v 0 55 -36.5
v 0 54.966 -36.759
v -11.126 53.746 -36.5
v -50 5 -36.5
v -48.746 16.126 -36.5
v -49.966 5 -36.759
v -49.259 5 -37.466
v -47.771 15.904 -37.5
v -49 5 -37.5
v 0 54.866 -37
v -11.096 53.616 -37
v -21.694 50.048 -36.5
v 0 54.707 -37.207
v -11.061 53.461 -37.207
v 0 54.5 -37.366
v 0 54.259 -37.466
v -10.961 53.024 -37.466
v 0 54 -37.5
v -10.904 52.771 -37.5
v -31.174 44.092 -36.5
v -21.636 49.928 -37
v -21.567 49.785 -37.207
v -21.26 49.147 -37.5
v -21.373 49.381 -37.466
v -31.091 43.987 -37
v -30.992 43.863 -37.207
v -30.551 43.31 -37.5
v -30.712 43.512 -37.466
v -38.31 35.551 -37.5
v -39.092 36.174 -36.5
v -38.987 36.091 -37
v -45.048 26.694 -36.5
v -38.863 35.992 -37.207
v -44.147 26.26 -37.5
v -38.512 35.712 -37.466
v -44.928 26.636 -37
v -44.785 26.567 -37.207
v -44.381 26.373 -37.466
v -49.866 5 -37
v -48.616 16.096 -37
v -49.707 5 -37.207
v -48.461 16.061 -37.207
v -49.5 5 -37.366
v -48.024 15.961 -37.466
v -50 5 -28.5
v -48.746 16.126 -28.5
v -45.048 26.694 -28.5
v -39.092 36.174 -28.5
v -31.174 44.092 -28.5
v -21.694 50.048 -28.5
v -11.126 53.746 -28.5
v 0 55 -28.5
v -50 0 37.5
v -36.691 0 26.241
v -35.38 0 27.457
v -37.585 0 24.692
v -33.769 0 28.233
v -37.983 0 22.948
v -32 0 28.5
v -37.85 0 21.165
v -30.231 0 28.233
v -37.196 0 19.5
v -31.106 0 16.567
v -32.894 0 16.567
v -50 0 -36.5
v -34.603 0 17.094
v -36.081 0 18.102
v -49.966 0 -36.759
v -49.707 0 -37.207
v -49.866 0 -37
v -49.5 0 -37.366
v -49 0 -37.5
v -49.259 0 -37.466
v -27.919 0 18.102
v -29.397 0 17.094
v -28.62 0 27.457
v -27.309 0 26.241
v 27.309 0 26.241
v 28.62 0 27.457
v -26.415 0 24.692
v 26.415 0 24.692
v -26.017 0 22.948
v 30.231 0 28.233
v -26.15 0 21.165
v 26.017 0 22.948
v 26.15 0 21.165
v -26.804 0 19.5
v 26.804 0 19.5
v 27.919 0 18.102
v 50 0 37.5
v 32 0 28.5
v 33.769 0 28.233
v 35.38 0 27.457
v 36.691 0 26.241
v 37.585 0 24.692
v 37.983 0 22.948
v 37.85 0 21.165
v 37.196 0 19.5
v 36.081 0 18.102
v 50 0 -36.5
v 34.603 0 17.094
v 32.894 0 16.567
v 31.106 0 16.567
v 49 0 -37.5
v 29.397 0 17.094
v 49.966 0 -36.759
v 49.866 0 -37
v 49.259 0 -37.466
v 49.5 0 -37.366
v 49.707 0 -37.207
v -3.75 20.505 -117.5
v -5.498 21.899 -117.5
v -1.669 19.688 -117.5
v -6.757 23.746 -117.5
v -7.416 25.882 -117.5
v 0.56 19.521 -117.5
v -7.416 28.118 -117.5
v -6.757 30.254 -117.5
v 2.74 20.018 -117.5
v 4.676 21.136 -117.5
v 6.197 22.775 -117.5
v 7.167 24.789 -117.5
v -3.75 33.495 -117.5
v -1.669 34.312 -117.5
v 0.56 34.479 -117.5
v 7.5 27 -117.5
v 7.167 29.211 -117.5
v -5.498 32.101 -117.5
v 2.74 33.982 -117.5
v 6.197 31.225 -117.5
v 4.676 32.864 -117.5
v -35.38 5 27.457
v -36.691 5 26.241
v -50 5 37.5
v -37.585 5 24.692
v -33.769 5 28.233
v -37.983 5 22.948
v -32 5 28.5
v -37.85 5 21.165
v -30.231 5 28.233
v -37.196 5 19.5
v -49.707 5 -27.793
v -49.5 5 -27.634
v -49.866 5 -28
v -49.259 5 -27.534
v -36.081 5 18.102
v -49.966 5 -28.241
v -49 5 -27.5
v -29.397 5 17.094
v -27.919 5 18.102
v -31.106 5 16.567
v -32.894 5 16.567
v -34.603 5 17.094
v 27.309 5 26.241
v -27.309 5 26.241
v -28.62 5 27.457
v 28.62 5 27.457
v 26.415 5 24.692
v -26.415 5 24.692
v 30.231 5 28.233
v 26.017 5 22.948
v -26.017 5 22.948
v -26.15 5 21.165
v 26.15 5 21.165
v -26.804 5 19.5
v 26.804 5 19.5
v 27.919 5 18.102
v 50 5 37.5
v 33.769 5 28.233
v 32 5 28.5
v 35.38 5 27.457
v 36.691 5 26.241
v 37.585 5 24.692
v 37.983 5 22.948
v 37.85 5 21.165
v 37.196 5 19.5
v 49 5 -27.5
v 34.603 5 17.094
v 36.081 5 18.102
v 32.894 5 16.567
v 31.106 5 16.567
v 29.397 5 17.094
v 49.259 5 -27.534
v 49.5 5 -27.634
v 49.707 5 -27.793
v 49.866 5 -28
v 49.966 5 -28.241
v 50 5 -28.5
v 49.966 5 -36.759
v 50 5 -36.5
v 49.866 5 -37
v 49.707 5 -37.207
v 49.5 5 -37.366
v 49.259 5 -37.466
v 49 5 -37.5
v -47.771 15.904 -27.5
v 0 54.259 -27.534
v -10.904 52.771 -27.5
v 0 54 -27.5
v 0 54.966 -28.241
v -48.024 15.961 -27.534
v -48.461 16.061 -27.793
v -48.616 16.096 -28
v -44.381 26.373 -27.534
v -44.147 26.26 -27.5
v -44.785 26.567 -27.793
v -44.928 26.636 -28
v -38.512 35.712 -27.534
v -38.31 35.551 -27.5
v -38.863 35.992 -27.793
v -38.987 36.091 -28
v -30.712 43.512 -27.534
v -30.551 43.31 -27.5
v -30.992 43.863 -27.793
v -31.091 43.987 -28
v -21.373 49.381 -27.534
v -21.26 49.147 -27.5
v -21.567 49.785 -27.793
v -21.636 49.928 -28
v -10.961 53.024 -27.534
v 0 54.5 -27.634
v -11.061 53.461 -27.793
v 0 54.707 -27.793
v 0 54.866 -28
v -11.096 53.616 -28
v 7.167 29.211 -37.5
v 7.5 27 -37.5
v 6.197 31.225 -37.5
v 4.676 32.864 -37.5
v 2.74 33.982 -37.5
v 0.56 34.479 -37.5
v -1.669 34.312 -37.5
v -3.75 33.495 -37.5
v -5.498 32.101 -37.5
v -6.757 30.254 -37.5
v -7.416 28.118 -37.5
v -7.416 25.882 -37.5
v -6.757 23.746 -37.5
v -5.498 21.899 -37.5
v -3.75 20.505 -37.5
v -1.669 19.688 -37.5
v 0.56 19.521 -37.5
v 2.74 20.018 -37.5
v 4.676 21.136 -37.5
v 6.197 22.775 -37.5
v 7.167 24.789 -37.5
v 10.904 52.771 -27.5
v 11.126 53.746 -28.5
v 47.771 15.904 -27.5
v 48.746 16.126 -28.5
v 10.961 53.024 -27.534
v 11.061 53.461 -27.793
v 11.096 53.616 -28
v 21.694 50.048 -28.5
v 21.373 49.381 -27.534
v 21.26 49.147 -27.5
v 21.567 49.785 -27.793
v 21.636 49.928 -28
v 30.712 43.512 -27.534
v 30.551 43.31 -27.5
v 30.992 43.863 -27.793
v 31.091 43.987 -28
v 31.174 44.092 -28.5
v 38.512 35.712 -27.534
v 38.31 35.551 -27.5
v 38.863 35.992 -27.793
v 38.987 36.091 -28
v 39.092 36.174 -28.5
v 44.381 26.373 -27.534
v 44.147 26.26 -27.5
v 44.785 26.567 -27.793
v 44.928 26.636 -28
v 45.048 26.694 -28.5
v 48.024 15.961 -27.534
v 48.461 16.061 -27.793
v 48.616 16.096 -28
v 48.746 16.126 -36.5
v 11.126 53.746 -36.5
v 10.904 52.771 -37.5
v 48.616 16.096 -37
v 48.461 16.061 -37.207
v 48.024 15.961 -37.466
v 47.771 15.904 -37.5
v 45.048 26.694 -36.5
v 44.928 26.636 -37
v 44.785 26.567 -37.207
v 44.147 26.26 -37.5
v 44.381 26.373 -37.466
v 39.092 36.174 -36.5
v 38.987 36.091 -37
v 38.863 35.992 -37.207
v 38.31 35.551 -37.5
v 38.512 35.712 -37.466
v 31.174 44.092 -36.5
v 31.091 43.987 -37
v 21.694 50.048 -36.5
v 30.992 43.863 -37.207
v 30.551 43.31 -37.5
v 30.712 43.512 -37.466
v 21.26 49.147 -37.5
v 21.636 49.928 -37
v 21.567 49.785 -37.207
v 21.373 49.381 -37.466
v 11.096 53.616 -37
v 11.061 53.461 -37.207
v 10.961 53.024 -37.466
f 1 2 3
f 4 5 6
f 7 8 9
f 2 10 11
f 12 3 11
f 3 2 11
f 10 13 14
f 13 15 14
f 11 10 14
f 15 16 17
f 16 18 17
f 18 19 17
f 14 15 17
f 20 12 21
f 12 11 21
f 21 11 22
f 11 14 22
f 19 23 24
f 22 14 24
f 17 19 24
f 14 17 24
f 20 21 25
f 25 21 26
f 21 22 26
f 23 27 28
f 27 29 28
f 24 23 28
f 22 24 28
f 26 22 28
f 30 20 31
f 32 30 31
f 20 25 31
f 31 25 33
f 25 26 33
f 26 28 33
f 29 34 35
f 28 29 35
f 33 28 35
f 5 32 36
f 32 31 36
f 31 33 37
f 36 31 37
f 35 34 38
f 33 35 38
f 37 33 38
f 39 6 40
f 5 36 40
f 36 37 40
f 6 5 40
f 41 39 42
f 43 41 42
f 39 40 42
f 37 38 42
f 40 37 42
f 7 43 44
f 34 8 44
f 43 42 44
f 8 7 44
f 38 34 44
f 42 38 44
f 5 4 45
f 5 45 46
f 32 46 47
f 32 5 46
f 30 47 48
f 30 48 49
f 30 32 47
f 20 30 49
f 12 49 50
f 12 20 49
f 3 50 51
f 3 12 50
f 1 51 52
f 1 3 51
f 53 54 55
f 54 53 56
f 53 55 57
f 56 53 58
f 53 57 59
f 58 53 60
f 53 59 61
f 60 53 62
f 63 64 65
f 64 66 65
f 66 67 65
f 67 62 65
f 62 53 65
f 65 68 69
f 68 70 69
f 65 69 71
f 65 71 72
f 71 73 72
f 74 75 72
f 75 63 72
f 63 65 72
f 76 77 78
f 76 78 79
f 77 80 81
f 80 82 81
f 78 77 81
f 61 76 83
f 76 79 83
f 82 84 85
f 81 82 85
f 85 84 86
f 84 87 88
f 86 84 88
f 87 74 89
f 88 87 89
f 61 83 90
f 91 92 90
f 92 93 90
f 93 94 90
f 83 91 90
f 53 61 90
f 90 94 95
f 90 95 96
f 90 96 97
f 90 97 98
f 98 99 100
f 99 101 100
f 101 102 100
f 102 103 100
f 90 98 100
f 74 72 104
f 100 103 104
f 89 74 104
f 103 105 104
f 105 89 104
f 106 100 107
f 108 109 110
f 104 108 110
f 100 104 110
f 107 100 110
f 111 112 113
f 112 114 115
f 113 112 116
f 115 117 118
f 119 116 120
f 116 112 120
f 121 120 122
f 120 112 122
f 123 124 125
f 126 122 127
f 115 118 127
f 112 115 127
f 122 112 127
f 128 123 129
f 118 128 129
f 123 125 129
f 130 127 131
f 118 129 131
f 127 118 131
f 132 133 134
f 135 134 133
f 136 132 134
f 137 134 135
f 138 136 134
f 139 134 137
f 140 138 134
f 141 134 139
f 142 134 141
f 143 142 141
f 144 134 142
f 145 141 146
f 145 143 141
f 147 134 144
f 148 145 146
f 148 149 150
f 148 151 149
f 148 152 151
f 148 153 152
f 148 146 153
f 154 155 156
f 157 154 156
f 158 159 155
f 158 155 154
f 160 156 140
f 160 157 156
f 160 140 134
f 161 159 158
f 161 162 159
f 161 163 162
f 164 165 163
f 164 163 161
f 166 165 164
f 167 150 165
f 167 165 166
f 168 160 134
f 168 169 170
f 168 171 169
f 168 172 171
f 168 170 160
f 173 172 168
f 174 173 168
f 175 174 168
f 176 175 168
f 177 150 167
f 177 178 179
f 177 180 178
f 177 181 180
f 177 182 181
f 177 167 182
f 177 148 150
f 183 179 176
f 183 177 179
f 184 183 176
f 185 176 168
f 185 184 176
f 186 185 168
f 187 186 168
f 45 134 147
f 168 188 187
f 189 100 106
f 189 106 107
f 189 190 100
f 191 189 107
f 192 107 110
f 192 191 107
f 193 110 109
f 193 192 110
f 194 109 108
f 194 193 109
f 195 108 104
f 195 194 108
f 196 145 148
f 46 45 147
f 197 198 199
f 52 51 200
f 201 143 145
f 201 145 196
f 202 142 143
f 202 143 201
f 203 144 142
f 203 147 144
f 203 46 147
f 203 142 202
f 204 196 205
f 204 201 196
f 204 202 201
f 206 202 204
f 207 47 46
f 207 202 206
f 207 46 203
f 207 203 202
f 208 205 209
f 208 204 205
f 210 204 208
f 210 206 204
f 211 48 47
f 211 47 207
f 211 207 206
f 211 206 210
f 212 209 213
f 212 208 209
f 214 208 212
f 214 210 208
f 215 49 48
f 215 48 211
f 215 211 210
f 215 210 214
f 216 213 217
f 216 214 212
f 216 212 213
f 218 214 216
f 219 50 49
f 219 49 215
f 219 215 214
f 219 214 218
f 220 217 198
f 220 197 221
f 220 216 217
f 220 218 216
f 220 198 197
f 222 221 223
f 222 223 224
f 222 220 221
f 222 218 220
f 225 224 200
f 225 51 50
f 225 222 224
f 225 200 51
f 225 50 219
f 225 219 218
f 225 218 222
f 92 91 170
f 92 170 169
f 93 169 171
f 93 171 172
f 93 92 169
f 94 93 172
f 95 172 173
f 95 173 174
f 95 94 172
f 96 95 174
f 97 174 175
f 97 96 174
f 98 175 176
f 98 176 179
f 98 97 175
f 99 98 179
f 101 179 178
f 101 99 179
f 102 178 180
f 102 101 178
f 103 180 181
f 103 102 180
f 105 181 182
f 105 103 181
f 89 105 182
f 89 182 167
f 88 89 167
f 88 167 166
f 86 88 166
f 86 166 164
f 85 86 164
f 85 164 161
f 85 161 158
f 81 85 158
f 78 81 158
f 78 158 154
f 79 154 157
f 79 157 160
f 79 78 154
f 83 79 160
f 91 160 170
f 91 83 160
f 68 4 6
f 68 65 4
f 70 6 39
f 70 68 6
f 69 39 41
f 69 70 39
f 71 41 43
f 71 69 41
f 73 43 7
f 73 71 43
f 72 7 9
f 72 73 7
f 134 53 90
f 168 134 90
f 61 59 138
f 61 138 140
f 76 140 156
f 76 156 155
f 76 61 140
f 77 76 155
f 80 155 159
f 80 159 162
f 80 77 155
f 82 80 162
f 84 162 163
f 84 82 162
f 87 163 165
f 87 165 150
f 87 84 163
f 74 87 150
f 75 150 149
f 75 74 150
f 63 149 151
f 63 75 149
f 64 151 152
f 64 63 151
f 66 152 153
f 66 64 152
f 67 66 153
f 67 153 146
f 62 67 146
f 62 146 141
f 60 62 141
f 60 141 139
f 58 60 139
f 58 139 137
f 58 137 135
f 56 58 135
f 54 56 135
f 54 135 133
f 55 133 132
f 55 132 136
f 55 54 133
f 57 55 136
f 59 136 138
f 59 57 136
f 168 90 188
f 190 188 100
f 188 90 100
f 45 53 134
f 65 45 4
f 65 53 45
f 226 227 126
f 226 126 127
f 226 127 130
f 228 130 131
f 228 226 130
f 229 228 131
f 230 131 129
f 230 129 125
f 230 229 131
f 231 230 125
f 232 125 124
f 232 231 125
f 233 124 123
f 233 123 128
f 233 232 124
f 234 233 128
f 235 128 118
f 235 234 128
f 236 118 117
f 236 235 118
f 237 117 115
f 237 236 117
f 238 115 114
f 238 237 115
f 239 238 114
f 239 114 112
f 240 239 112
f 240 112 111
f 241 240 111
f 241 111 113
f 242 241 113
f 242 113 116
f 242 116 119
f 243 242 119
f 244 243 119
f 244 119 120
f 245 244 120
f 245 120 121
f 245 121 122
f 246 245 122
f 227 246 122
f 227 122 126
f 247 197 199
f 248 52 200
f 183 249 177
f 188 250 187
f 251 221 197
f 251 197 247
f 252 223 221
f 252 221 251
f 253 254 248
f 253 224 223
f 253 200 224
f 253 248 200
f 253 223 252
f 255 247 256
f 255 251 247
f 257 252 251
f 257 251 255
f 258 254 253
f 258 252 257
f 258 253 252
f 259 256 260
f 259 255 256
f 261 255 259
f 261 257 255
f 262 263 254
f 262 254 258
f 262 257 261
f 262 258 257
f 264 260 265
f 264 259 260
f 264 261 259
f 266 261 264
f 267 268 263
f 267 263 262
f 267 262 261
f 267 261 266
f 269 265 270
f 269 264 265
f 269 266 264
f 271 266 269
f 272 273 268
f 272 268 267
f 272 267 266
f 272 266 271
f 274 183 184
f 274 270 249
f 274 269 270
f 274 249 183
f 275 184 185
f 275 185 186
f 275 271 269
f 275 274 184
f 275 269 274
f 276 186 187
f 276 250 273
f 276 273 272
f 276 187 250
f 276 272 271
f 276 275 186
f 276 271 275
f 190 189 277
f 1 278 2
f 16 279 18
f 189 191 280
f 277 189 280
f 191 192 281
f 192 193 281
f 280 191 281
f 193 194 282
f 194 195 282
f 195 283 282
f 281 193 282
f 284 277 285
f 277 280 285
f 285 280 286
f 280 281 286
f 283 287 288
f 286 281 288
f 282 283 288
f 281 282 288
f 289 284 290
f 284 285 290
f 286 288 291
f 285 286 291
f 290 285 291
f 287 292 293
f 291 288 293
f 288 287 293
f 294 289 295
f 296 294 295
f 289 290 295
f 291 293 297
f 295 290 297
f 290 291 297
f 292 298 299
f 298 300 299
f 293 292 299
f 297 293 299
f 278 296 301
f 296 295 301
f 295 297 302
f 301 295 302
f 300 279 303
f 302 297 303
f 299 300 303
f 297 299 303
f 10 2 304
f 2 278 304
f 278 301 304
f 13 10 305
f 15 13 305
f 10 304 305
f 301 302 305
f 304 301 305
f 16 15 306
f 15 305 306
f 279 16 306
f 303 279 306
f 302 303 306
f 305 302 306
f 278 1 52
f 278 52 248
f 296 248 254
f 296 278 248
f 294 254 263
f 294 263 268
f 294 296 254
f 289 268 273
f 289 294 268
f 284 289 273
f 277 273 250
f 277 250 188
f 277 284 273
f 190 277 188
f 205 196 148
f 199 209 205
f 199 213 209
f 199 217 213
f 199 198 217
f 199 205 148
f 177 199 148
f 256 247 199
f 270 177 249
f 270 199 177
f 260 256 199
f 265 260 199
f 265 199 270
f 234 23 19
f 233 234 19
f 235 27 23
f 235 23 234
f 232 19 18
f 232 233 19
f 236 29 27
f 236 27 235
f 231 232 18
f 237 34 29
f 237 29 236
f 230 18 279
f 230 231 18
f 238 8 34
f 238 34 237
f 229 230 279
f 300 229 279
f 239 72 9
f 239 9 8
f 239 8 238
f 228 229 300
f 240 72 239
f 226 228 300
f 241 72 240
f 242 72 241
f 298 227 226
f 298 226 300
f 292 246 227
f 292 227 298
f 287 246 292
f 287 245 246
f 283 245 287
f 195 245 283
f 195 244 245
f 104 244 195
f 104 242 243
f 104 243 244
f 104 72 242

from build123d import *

# Parameters (mm, degrees)
SKETCH2_W           = 100
SKETCH2_H           = 75
SKETCH2_R           = 6
BOSS_EXTRUDE1_DEPTH = 5
SKETCH3_W           = 100
SKETCH3_H           = 10
BOSS_EXTRUDE2_DEPTH = 50
CUT_EXTRUDE2_START  = -10
CUT_EXTRUDE2_DEPTH  = 10
FILLET1_R           = 1
FILLET2_R           = 1
SKETCH6_R           = 7.5
BOSS_EXTRUDE3_DEPTH = 90


# Read off the part's stored shape, not the designer's step: Cut-Extrude2
with BuildPart() as part:
    # Sketch2 → Boss-Extrude1 (new body)
    with BuildSketch(Plane(origin=(0, 0, 0), x_dir=(1, 0, 0), z_dir=(0, 1, 0))):
        Rectangle(SKETCH2_W, SKETCH2_H)
        with Locations(Location((-32, -22.5, 0), (0, 0, 270))):
            Circle(SKETCH2_R, mode=Mode.SUBTRACT)
        with Locations(Location((32, -22.5, 0), (0, 0, 270))):
            Circle(SKETCH2_R, mode=Mode.SUBTRACT)
    extrude(amount=BOSS_EXTRUDE1_DEPTH)

    # Sketch3 → Boss-Extrude2 (add)
    with BuildSketch(Plane(origin=(0, 5, 0), x_dir=(1, 0, 0), z_dir=(0, 1, 0))):
        with Locations((0, 32.5)):
            Rectangle(SKETCH3_W, SKETCH3_H)
    extrude(amount=BOSS_EXTRUDE2_DEPTH)

    # Cut-Extrude2 outline → Cut-Extrude2 (cut)
    with BuildSketch(Plane.XY.offset(-27.5).offset(CUT_EXTRUDE2_START)):
        with BuildLine():
            Line((-50, 55), (-50, 5))
            ThreePointArc((-50, 5), (-35.355339097, 40.355339022), (-1.05e-07, 55))
            Line((-1.05e-07, 55), (-50, 55))
        make_face()
        with BuildLine():
            Line((50, 55), (-1.05e-07, 55))
            ThreePointArc((-1.05e-07, 55), (35.355339022, 40.355339097), (50, 5))
            Line((50, 5), (50, 55))
        make_face()
    extrude(amount=CUT_EXTRUDE2_DEPTH, mode=Mode.SUBTRACT)

    # Fillet1
    fillet1_edges = [part.edges().sort_by_distance(p)[0] for p in [
        (-50, 2.5, -37.5),
        (50, 2.5, -37.5),
        (35.355339022, 40.355339097, -37.5),
    ]]
    fillet(fillet1_edges, radius=FILLET1_R)

    # Fillet2
    fillet2_edges = [part.edges().sort_by_distance(p)[0] for p in [
        (35.355339022, 40.355339097, -27.5),
    ]]
    fillet(fillet2_edges, radius=FILLET2_R)

    # Sketch6 → Boss-Extrude3 (add)
    with BuildSketch(Plane.XY.offset(-27.5)):
        with Locations((0, 27)):
            Circle(SKETCH6_R)
    extrude(amount=-BOSS_EXTRUDE3_DEPTH)


solid = part.part
